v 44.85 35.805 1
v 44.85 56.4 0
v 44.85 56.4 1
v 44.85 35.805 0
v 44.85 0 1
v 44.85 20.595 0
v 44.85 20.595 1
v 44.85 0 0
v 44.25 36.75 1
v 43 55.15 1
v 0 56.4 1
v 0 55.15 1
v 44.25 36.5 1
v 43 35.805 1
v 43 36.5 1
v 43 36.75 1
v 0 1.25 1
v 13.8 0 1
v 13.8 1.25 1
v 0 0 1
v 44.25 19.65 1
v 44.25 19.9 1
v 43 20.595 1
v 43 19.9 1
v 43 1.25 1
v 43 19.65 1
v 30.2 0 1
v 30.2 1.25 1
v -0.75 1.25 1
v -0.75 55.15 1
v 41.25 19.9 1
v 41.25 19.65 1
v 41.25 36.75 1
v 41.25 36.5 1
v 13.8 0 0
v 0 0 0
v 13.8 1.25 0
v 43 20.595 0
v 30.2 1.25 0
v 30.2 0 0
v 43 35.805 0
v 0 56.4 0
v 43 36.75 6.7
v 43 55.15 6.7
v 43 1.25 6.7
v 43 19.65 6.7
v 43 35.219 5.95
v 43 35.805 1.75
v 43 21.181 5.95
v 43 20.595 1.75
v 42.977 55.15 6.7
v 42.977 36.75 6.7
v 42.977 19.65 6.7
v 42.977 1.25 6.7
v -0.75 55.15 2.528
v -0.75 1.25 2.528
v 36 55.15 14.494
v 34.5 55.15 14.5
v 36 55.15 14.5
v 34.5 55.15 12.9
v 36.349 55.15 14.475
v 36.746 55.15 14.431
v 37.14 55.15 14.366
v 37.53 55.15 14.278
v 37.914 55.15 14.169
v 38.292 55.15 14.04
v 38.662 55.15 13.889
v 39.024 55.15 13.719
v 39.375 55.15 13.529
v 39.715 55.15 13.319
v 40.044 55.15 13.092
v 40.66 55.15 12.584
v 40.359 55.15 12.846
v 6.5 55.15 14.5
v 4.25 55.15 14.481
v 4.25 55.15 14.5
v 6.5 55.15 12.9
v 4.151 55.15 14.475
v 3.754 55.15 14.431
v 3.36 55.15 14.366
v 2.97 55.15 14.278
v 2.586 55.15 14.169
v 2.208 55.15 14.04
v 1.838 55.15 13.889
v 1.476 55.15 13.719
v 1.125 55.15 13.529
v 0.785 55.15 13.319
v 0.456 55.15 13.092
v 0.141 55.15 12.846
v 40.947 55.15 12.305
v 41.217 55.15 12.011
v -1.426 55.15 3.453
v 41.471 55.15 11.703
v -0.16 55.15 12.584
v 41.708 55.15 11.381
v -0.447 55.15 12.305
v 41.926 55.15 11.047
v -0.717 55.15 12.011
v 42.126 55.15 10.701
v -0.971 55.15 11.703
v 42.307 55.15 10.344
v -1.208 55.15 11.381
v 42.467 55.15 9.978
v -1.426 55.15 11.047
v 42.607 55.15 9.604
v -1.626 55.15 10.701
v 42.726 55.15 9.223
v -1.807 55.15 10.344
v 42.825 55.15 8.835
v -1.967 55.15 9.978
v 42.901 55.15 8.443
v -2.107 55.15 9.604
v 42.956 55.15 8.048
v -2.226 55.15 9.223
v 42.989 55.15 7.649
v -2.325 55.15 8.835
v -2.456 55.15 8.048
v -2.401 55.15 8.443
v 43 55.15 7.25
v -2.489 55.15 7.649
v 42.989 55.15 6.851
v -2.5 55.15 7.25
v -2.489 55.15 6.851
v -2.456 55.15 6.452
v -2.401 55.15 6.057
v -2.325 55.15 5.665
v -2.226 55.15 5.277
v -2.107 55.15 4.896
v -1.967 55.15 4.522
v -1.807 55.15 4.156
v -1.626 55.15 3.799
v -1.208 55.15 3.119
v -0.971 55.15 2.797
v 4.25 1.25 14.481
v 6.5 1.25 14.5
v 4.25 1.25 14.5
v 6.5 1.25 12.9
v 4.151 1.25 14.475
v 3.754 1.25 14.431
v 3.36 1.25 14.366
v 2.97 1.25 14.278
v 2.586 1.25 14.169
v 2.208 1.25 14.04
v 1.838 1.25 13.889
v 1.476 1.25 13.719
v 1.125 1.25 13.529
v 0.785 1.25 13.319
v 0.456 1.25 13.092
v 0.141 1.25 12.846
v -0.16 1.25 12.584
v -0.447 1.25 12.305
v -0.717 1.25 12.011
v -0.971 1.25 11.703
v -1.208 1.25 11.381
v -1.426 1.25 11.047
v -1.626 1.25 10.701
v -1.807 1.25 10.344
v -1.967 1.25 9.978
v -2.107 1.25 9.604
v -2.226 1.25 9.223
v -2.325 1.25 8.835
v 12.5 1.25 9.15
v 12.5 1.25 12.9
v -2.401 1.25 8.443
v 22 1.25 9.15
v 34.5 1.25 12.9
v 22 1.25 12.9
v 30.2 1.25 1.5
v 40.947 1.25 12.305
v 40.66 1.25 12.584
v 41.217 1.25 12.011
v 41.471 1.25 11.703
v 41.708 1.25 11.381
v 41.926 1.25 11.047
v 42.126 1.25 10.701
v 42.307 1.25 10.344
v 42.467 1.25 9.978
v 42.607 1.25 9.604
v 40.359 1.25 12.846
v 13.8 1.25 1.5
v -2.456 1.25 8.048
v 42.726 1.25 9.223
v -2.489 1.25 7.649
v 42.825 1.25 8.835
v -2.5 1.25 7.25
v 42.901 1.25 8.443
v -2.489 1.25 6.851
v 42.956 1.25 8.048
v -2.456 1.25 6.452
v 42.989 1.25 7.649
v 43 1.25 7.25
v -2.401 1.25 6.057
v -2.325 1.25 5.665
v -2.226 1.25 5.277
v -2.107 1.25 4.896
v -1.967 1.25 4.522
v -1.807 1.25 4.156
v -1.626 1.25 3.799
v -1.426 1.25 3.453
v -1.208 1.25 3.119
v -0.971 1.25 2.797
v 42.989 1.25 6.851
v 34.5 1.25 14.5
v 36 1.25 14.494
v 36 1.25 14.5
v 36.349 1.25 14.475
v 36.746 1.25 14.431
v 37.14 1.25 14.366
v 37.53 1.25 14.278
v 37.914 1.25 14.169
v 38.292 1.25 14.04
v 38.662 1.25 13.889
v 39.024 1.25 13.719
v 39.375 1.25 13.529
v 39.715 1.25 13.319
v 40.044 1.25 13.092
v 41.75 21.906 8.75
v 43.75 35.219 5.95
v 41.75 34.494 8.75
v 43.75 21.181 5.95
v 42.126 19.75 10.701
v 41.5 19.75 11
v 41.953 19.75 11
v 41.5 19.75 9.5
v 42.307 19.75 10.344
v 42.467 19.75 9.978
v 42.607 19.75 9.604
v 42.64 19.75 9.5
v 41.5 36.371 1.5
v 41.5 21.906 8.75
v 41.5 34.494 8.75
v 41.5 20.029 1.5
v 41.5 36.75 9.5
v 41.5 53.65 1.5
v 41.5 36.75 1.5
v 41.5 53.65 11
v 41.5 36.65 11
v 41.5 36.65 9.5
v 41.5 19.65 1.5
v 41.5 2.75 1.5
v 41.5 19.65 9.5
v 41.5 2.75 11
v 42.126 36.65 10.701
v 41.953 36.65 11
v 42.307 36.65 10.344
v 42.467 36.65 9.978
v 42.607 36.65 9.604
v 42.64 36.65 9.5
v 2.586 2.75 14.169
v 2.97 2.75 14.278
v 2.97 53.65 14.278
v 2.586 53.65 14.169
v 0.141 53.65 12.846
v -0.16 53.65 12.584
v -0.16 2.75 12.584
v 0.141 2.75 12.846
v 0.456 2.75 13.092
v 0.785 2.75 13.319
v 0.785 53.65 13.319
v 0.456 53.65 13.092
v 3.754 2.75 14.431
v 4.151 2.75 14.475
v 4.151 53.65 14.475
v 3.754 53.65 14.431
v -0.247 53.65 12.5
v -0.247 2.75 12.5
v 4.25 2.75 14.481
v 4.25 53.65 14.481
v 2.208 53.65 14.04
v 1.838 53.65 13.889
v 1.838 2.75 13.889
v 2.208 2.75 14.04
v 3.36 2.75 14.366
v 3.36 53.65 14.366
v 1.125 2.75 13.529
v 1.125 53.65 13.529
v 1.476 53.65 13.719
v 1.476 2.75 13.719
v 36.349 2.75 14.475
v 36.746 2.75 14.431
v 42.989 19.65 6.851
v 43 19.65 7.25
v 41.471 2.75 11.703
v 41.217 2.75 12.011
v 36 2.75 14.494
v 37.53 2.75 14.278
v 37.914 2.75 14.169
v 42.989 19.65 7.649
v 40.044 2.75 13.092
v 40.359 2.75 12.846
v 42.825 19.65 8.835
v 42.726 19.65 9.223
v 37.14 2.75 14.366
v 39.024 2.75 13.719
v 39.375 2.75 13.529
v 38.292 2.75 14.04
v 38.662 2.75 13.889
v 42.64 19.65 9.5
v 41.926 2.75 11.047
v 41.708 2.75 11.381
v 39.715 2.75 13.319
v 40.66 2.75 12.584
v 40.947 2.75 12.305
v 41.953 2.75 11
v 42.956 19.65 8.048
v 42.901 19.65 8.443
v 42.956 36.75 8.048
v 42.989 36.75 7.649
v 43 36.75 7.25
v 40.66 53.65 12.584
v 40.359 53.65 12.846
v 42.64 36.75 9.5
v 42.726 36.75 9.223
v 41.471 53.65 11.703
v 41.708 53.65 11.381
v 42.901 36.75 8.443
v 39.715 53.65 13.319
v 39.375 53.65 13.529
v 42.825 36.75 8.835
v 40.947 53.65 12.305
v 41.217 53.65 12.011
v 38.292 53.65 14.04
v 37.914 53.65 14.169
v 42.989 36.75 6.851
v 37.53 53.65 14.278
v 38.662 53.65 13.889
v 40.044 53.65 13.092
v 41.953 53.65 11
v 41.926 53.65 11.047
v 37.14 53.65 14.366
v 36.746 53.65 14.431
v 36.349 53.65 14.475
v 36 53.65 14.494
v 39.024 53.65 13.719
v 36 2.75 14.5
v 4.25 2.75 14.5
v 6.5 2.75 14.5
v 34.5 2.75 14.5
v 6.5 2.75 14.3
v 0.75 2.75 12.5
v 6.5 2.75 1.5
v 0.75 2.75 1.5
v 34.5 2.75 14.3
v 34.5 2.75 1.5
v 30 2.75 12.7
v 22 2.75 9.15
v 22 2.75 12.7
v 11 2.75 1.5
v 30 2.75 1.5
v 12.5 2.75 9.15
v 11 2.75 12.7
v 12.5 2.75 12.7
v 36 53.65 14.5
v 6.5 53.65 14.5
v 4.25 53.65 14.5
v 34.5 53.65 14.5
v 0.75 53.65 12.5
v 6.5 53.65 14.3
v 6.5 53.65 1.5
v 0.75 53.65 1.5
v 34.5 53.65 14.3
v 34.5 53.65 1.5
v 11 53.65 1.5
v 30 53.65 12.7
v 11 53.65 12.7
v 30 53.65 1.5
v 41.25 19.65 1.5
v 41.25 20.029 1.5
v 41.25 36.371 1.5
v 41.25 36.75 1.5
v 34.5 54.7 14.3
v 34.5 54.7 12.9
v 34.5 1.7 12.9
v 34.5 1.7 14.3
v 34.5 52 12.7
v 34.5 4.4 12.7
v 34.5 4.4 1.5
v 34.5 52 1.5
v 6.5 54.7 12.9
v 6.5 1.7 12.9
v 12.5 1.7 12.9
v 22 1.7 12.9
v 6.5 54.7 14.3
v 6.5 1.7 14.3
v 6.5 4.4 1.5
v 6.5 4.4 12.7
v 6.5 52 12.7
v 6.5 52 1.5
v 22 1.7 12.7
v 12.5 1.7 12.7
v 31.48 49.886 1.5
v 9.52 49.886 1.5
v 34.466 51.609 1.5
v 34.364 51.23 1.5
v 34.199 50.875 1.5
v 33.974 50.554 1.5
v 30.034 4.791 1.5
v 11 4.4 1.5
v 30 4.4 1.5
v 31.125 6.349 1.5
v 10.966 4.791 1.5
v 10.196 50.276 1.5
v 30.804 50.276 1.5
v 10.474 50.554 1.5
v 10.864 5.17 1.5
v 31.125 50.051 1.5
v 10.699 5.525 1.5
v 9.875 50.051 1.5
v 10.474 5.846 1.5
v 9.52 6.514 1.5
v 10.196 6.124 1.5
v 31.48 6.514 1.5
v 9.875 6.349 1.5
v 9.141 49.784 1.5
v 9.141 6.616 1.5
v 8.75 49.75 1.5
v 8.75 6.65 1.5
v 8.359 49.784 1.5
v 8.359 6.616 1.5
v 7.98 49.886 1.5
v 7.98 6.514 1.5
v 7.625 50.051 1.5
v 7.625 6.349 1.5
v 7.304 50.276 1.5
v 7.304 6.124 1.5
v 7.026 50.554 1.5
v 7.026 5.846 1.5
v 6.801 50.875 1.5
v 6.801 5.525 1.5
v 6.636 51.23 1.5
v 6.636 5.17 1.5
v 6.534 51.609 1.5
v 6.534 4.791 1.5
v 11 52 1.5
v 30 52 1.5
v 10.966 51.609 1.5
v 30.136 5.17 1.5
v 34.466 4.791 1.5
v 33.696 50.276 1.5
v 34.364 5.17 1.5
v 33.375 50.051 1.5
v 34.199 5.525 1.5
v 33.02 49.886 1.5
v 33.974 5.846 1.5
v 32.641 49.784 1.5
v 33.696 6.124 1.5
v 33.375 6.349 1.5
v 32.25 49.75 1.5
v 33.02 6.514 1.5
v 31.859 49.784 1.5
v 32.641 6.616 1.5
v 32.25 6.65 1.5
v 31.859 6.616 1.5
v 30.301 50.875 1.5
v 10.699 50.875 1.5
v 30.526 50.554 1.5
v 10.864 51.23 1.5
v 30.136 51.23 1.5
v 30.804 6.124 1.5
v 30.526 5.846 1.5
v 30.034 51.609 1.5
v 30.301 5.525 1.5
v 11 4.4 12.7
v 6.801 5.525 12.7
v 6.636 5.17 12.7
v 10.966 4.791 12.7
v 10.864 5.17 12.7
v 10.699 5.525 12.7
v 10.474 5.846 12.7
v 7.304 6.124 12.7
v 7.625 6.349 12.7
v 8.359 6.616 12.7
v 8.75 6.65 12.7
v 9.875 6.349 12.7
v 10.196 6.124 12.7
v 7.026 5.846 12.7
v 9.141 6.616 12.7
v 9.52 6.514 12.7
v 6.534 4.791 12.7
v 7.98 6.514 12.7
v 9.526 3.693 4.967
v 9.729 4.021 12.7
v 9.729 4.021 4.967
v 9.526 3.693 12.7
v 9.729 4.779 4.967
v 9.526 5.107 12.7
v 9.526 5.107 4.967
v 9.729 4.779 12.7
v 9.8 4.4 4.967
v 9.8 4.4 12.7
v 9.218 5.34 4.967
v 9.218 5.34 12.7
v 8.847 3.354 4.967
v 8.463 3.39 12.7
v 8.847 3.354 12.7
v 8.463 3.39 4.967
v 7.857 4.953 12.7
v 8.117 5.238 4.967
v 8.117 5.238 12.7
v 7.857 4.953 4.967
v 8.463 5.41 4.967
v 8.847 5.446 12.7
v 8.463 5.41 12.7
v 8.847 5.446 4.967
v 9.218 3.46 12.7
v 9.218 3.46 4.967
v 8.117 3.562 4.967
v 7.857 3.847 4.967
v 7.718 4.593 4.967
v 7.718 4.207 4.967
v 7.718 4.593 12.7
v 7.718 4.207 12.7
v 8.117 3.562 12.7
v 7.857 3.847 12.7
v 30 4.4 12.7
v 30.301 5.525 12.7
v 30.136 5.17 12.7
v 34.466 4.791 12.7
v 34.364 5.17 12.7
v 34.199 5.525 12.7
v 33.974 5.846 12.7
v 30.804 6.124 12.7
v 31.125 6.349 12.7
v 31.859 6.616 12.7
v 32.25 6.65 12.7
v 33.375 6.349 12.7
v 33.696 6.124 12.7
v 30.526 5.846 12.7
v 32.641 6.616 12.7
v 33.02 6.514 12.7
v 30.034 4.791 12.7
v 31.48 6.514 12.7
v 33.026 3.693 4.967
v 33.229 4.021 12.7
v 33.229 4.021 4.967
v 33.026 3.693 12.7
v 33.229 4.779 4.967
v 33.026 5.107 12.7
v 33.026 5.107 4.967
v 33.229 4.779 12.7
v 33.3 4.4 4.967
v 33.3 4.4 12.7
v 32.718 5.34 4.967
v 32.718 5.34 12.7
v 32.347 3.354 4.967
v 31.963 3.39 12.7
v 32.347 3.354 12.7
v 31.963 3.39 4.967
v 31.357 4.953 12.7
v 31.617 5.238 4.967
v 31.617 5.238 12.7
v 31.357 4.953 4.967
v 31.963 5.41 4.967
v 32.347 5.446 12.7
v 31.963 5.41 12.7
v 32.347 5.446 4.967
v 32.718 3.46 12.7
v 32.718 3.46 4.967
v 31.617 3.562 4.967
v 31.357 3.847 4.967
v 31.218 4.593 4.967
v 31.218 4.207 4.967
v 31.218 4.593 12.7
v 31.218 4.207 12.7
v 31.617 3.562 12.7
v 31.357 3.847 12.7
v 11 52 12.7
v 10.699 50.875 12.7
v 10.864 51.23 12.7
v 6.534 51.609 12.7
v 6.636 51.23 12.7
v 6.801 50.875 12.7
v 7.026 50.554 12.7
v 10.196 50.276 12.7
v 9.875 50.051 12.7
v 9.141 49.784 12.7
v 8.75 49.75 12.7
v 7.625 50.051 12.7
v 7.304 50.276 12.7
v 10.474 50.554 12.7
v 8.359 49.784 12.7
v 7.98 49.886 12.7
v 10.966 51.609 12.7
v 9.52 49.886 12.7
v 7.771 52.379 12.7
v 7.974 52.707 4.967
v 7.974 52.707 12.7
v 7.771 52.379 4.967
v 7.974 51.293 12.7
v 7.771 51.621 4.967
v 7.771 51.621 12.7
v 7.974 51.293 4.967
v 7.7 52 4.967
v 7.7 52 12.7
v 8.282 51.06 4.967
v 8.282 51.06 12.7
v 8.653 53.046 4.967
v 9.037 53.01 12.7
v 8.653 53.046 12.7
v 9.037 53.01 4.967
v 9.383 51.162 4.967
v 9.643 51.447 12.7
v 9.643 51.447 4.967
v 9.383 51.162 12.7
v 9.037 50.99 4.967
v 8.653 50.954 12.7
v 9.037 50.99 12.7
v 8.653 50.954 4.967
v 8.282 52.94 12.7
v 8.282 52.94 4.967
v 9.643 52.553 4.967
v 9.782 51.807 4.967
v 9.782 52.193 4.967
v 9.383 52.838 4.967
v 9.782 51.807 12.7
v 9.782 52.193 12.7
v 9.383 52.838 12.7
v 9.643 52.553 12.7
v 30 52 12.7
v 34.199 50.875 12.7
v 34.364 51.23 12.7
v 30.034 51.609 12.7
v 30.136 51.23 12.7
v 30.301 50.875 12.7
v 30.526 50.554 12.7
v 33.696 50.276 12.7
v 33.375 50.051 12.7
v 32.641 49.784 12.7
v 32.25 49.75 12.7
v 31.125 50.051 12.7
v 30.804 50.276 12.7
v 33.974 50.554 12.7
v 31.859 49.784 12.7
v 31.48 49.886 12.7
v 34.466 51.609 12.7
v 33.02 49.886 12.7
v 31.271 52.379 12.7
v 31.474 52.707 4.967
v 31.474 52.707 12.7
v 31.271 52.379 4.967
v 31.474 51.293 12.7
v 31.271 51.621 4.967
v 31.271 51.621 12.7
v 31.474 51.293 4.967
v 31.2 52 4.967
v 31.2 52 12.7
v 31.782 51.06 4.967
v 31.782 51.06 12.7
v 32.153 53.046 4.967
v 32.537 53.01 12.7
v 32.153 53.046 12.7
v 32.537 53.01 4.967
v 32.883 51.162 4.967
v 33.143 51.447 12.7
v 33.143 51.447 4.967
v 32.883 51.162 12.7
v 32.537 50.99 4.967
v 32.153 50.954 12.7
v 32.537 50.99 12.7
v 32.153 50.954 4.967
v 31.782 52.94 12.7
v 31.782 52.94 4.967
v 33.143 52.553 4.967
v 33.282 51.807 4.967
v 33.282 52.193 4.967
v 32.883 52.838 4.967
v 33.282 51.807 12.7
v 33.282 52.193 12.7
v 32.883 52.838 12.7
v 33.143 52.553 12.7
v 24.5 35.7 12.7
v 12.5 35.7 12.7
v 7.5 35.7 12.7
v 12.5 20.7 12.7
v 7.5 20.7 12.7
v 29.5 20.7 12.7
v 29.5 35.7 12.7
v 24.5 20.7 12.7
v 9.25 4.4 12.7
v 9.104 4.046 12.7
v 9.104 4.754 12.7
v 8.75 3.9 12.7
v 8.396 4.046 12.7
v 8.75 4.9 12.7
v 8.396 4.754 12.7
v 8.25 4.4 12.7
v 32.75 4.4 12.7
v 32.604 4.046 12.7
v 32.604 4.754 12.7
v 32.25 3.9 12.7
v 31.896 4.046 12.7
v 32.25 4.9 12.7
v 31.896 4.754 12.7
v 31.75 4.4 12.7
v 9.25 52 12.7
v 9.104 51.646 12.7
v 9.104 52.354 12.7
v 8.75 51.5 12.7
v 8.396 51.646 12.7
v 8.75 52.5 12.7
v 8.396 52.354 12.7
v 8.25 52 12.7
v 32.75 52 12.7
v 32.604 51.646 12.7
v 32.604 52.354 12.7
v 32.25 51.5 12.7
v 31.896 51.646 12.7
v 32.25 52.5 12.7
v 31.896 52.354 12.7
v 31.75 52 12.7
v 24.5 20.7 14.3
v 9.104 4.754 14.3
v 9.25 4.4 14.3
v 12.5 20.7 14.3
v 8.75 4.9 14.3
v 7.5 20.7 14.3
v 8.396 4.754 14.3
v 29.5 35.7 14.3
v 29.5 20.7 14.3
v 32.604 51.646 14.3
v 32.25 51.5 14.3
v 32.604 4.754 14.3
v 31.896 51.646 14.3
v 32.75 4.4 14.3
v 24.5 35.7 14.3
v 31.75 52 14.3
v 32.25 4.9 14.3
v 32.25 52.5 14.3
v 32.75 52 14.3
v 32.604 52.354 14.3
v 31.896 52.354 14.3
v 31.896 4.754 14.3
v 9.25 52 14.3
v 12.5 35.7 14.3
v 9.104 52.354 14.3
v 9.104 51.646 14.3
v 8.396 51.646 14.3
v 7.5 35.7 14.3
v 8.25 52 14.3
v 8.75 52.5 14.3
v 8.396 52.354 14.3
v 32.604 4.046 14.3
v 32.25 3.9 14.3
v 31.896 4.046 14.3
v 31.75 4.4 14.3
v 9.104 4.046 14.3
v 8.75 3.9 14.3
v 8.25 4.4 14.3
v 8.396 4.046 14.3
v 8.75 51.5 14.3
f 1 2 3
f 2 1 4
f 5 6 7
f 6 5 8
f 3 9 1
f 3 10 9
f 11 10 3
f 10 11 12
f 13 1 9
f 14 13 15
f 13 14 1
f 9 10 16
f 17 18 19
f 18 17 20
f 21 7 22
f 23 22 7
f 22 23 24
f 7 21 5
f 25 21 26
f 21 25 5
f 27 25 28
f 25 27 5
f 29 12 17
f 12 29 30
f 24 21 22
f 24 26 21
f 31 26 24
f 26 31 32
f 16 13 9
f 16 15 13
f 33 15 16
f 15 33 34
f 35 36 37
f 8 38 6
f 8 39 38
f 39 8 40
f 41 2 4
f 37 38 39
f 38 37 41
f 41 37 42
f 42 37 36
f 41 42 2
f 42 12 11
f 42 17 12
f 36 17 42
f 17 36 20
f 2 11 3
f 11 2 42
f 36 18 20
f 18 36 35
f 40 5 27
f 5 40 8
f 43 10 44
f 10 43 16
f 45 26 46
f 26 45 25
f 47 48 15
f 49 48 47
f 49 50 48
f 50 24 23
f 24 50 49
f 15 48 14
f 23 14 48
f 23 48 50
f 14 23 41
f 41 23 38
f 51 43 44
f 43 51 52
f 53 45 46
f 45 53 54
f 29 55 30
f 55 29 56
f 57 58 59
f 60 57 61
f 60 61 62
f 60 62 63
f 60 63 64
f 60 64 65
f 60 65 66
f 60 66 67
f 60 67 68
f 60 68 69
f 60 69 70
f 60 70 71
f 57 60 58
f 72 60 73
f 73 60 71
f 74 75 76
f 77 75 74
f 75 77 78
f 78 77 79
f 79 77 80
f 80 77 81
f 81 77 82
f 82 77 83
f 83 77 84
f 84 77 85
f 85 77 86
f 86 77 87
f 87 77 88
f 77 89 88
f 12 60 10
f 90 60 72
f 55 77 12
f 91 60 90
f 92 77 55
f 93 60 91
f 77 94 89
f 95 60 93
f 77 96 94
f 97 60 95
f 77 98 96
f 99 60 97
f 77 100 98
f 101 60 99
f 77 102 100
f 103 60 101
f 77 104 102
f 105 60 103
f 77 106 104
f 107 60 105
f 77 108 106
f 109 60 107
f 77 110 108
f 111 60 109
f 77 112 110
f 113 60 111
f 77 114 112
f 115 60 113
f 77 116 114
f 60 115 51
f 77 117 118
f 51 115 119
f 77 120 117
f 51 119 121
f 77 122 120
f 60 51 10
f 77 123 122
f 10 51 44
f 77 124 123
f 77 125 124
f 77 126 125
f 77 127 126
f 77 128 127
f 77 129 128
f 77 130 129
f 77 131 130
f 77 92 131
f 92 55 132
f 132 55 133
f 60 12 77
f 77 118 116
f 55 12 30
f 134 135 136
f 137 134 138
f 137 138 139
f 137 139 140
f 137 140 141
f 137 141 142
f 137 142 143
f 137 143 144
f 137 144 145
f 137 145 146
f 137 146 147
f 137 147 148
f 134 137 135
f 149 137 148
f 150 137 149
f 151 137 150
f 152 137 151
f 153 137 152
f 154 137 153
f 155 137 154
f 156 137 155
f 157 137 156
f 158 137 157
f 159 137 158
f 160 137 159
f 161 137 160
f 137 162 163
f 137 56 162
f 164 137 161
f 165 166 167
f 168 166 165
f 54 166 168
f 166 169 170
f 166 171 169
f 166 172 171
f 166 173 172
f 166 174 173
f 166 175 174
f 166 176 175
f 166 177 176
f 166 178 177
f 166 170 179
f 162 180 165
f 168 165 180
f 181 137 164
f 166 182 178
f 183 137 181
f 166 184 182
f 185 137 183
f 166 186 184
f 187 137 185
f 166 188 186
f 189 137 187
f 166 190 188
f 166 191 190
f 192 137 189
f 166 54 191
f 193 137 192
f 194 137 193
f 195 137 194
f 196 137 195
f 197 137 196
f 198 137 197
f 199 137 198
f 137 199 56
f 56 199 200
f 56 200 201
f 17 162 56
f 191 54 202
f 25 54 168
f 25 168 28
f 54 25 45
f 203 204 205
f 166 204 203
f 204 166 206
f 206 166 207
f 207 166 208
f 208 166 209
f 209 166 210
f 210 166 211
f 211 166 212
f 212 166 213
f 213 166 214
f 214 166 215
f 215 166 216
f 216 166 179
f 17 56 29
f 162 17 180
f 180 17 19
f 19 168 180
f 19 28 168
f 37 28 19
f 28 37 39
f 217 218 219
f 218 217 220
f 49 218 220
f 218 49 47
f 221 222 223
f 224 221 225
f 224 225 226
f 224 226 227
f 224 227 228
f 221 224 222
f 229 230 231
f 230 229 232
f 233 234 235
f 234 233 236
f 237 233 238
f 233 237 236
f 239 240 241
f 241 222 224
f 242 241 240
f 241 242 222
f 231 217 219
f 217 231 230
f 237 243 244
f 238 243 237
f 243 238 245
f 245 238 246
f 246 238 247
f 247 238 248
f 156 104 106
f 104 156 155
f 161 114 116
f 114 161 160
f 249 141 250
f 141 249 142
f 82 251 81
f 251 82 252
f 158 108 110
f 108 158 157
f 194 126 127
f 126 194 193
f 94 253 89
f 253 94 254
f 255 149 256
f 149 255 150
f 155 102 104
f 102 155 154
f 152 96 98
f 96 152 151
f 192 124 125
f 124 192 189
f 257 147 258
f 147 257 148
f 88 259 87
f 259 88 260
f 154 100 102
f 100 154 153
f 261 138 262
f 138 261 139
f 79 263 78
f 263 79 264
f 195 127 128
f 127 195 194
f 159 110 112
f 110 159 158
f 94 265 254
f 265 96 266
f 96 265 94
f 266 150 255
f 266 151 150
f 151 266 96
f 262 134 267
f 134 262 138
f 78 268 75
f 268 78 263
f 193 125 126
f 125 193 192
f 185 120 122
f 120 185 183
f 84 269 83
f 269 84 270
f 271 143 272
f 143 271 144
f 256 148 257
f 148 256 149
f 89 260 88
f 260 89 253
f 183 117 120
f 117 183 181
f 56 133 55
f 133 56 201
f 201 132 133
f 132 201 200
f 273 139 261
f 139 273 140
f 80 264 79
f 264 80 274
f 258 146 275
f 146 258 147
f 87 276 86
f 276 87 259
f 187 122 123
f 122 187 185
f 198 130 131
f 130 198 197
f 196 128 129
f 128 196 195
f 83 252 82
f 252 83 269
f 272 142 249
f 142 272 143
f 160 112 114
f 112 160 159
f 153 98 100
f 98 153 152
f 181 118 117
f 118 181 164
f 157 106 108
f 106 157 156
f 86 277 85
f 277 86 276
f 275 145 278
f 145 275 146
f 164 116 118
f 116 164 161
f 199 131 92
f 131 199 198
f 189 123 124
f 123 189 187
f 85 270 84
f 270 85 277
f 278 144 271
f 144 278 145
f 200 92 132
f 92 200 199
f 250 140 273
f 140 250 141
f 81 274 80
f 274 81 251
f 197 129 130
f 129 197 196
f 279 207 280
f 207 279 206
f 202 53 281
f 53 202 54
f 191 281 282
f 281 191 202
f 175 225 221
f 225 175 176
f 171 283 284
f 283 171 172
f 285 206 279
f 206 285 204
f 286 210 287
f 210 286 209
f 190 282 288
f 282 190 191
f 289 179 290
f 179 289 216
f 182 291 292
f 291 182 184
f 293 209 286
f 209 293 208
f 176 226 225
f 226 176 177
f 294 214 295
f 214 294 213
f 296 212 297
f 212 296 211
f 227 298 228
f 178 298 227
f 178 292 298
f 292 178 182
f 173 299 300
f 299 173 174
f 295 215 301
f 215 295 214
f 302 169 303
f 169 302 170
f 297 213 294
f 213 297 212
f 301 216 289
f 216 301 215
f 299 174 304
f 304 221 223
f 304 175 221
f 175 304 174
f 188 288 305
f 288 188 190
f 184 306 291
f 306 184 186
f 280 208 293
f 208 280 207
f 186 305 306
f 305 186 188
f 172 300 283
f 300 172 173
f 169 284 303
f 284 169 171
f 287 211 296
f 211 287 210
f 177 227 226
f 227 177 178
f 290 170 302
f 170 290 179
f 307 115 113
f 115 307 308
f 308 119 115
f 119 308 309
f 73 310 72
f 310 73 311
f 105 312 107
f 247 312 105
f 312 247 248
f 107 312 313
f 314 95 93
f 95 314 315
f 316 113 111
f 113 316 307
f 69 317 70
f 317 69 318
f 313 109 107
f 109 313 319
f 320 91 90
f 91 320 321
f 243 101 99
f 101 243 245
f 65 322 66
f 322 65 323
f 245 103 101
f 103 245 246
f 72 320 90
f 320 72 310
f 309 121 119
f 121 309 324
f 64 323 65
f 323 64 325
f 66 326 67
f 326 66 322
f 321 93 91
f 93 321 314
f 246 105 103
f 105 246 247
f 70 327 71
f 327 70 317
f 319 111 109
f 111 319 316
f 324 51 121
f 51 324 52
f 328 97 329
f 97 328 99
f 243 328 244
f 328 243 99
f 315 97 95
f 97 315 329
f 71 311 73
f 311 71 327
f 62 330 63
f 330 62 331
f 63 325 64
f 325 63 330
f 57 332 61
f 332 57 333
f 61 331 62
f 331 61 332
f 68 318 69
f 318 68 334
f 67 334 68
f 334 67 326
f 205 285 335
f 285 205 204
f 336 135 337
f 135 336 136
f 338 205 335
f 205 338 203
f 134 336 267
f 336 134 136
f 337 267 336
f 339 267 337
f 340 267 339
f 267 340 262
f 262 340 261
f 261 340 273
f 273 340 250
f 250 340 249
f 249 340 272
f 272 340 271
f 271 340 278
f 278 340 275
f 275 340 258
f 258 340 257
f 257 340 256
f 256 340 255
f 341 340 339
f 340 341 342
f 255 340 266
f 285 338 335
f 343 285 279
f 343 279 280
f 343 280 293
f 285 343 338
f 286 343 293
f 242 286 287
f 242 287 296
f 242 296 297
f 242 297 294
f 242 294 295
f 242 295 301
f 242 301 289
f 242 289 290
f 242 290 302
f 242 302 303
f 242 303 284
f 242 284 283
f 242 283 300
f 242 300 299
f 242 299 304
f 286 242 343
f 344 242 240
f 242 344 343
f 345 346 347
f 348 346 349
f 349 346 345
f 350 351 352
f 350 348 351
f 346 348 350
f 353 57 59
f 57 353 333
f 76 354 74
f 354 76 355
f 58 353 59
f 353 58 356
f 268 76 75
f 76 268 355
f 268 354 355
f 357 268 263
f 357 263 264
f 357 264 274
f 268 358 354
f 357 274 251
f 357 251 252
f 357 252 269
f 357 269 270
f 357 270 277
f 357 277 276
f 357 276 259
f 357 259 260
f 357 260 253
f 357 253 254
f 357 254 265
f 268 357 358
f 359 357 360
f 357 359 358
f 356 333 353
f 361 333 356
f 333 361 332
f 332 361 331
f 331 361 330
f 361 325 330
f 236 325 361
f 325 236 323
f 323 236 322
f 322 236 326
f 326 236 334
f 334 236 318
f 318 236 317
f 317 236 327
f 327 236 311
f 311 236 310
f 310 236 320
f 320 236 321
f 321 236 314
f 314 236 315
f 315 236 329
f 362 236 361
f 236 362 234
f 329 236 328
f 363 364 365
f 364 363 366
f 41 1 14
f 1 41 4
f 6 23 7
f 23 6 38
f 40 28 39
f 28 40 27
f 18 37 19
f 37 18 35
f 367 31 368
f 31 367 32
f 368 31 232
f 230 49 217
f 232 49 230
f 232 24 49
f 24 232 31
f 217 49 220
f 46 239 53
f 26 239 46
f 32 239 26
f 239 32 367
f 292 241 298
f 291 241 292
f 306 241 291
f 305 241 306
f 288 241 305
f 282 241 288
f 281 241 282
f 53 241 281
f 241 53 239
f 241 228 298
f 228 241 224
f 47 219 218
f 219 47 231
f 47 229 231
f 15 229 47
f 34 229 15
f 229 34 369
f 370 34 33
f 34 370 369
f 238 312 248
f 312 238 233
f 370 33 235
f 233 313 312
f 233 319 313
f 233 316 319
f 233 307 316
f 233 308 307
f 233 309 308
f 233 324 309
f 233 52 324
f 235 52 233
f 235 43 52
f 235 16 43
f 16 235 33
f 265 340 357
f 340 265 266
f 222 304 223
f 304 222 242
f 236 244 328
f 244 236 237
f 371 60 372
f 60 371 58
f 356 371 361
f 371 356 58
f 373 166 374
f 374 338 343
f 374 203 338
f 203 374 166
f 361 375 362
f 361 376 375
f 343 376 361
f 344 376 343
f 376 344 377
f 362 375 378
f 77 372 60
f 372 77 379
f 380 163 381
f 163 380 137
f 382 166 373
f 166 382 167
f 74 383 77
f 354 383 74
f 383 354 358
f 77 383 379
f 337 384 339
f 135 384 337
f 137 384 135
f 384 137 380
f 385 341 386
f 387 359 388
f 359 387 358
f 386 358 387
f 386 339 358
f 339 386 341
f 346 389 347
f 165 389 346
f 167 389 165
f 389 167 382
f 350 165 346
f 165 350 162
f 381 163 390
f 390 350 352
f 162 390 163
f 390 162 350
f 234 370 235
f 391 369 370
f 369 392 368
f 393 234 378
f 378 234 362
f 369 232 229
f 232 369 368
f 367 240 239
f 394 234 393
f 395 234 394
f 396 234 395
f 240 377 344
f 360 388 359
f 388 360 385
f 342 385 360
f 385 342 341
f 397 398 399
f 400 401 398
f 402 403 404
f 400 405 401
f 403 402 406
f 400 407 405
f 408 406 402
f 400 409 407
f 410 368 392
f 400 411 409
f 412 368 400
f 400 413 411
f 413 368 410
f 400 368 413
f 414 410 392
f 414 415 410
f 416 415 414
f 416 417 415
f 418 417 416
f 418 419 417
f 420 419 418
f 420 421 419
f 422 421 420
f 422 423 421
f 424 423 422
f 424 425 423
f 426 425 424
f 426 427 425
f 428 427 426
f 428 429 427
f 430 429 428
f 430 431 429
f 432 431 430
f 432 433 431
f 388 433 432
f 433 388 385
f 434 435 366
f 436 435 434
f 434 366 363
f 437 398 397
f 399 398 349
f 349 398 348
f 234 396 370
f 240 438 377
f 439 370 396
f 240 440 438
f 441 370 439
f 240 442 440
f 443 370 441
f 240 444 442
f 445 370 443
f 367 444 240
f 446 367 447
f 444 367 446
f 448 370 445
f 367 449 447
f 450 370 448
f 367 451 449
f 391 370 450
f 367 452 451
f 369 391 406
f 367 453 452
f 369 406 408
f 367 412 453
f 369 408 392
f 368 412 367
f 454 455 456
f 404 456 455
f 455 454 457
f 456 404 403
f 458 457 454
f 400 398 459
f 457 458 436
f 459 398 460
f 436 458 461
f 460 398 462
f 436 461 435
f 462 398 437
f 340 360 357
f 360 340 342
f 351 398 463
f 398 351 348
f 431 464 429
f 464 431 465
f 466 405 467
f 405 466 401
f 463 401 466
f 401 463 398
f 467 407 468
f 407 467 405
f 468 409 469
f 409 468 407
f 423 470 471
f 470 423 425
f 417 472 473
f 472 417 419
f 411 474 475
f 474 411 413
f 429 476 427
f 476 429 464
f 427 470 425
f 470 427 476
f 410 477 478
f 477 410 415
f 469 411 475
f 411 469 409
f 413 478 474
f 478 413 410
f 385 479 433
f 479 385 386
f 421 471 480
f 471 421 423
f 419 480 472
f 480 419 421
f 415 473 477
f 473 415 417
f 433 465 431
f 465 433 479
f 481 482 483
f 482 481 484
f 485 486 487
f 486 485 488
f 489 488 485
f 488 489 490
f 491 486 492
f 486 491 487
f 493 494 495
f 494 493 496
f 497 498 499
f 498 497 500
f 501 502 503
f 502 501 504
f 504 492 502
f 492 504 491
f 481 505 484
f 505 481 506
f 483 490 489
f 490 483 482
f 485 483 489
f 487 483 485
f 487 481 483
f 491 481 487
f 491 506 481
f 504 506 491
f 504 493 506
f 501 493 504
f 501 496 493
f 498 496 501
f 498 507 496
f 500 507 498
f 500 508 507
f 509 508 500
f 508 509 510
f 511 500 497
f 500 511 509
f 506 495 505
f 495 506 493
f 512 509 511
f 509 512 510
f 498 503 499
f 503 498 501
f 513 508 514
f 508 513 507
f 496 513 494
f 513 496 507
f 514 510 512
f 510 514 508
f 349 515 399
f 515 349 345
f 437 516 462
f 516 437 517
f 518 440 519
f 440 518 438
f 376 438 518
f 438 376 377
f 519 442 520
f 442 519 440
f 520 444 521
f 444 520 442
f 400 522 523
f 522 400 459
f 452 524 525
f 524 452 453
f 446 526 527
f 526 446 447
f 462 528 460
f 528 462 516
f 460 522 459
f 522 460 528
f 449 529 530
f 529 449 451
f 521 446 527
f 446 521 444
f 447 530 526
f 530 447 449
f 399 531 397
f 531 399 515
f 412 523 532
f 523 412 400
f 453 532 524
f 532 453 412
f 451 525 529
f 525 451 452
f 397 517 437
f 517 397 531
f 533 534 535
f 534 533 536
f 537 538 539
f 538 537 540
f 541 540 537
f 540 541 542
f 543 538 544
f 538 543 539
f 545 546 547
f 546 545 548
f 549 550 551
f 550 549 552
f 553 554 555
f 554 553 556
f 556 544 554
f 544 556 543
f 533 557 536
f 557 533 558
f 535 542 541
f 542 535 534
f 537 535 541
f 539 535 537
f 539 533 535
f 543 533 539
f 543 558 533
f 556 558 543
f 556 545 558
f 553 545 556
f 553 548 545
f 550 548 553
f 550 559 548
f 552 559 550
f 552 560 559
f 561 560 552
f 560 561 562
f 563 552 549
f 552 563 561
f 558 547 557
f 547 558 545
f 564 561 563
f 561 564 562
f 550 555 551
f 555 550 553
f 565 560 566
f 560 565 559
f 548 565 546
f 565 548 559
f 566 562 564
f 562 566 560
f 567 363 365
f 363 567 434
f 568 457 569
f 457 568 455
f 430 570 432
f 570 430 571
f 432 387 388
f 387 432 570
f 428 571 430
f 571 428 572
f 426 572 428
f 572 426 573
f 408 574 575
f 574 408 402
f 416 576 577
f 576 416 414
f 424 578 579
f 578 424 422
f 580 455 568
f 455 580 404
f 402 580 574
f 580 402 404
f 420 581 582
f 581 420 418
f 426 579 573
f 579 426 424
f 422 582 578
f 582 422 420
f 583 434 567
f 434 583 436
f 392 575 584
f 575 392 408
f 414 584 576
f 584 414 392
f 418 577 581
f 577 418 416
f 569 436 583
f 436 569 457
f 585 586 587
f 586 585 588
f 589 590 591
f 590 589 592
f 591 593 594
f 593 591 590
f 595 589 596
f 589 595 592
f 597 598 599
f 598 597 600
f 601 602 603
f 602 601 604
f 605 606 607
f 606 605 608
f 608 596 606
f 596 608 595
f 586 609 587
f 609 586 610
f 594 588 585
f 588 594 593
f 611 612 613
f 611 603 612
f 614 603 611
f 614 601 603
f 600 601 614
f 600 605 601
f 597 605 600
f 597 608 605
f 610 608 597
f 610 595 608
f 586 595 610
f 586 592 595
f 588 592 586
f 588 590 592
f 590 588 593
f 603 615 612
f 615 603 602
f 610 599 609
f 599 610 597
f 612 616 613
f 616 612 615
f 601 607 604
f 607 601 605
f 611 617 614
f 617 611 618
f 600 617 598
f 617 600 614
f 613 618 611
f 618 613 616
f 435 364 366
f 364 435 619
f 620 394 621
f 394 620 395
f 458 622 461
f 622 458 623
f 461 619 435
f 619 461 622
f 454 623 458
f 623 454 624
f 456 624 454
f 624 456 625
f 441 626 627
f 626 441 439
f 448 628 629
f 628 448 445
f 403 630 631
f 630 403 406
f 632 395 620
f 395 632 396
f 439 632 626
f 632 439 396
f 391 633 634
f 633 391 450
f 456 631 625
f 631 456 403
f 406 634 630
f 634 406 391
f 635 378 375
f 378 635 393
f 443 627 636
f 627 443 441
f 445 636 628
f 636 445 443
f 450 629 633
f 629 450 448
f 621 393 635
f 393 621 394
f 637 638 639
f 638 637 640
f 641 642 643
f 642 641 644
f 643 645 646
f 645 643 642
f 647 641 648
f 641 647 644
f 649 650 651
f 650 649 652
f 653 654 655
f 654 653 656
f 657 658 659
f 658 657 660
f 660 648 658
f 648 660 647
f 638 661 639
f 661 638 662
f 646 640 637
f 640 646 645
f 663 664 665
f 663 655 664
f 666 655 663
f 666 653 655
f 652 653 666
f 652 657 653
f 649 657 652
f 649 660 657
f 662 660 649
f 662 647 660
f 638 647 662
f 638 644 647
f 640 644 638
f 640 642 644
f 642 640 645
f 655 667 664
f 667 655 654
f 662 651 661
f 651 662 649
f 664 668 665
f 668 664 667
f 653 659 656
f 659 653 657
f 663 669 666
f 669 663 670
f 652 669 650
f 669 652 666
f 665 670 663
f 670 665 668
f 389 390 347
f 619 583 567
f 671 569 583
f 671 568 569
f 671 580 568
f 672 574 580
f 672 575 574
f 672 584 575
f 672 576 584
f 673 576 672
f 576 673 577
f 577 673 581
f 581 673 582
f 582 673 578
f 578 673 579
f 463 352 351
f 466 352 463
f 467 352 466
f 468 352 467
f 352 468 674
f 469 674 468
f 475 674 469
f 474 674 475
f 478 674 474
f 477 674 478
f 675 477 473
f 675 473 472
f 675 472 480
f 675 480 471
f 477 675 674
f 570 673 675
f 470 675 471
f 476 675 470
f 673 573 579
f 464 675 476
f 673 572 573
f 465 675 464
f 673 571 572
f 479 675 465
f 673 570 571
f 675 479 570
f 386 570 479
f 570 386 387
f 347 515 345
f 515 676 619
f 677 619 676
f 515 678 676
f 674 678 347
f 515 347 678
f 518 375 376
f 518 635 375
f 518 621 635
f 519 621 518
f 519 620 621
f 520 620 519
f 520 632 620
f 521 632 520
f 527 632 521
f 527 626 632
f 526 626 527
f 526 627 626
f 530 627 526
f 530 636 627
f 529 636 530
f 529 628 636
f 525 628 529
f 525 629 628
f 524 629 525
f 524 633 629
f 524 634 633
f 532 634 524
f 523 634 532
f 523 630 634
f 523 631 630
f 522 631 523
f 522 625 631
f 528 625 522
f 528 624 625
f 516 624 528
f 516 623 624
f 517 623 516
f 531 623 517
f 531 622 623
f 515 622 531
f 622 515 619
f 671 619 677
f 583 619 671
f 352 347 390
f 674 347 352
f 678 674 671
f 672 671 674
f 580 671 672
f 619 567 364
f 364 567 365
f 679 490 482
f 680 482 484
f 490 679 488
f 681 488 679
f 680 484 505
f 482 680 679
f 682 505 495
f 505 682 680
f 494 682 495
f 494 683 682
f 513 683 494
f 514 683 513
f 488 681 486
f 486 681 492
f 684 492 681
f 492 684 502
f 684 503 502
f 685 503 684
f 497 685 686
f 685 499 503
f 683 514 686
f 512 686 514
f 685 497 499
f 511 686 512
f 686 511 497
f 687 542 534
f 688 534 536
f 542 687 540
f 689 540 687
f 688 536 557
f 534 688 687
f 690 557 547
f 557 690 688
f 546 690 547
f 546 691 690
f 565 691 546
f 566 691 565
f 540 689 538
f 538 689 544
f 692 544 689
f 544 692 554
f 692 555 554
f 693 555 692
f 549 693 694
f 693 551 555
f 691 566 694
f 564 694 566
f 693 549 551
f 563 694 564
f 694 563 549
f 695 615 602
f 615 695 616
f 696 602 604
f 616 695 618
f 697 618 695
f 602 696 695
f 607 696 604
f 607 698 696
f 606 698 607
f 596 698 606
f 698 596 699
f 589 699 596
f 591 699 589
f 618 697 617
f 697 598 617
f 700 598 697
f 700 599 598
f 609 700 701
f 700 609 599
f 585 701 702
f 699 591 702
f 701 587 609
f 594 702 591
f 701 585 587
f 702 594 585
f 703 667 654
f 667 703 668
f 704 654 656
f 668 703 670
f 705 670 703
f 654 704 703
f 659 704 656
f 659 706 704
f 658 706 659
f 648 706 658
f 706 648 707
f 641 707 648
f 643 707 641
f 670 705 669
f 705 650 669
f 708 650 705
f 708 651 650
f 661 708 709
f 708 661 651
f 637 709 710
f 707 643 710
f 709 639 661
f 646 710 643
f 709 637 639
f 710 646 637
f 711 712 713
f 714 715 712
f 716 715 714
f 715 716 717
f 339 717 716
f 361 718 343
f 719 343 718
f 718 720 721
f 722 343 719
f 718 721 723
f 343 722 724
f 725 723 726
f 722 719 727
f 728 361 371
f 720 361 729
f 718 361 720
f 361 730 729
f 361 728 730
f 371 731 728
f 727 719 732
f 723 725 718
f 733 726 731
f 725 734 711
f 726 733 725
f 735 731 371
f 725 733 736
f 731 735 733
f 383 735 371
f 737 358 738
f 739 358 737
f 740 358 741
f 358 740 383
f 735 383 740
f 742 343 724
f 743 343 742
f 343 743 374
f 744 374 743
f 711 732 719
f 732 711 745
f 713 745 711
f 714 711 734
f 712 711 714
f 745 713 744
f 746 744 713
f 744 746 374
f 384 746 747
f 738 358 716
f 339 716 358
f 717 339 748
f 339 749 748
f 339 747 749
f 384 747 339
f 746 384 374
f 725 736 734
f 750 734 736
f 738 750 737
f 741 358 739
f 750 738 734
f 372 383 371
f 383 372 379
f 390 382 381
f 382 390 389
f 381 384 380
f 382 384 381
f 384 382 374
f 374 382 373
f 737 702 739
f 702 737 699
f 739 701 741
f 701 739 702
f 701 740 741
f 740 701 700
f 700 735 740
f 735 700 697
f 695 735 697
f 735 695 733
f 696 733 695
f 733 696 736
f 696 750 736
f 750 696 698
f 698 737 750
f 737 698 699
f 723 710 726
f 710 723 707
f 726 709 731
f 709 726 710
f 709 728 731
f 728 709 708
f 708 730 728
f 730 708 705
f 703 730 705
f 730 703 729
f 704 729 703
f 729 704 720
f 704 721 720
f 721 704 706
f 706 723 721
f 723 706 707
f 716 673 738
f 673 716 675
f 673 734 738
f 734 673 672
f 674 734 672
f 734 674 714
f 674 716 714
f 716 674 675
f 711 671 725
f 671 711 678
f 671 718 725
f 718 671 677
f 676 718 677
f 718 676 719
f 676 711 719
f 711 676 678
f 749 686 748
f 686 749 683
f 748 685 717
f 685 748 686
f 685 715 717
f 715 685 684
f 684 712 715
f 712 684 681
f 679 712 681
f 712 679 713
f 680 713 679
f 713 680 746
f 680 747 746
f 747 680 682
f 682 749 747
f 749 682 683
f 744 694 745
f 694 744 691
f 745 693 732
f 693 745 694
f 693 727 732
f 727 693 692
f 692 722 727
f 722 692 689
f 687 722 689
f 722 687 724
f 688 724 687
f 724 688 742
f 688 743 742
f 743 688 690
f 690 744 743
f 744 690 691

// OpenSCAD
/*
  TI-58/59 Battery Lid
  This is intended to hold a PCB and a LiPo battery,
  and charge from USB. 

  Dimensions more or less 'cribbed' from a BP-1 and an
  existing STL model that I imported into FreeCAD to measure.

  Version 1.1
  T. LeMense
  December 21, 2020
*/


$fa = 1;
$fs = 0.4;

// baseplate (first surface)
base_t = 1.0;
base_w = 44.85;
base_l = 56.4;
ledge_t = 1.25;
ledge_t1 = 0.75;
ledge_t2 = 1.85;

// PCB information
pcb_t = 1.6;
pcb_w = 28;
pcb_l = 53;
pcb_z = 13.5-pcb_t;
pcb_x = 6.5;

// USB connector cutout
// MOLEX 1050170001
usb_t = 3.75;
usb_w = 9.5;

// "superstructure"
super_w = base_w - ledge_t2 + ledge_t1;
super_l = base_l - 2*ledge_t;
super_h = 5.7;  // the "straight rise" from baseplate
super_z = base_t;  // the "altitude" at which everything starts
super_wall_t = 1.5;
super_floor_t = 0.5;
round_rad = (pcb_z+pcb_t+super_z)/2;

// latch 'tab' is extruded 2D
latch_tab_t = super_wall_t + 0.75;
latch_tab_h = 2.8;
latch_tab_t2 = 0.25;
latch_tab_w = 16.9;
latch_tab_z = 4.95;

p0 = [0, 0];
p1 = [0, latch_tab_h];
p2 = [latch_tab_t2,latch_tab_h];
p3 = [latch_tab_t,0];
tab_points = [p0, p1, p2, p3];
    
// hinge cutouts is extruded 2D
latch_tab_w2 = 12.0;
latch_tab_h2 = super_h+latch_tab_h;

p4 = [0, 0];
p5 = [0, latch_tab_h2];
p6 = [(latch_tab_w - latch_tab_w2)/2,latch_tab_h2];
p7 = [latch_tab_t2,0];
cutout_points = [p4, p5, p6, p7];

echo("inside cavity width is", super_w-2*super_wall_t);
echo("inside cavity length is", super_l-2*super_wall_t);
echo("PCB dimensions are ",pcb_w," x ",pcb_l);

module RoundedBoss(side,height,hole_dia){
    difference() {
        union() {
        cube([side,side/2,height]);
        translate([side/2,side/2,0])
        cylinder(r=side/2,h=height);
        }
        
        translate([side/2,side/2,height/3])
        cylinder(r=hole_dia/2,h=height/1.5);
    }
}

function RoundedBossHoleCenter(side,height,hole_dia) = [side/2,side/2,0];
   

/* 
  Define some "cuts" to export as DXF, to help
  guide the PCB size (cut 1) and PCB hole placement
  (cut 2).

  uncomment the projection.. and the desired translate line
*/

//projection(cut = true) 
//translate([0,0,-base_t/2])   //cut1
//translate([0,0,-pcb_z])   //cut2
//translate([0,0,-10.5])  //cut3
//translate([0,0,-20]) //cut4

union(){
difference() {
    union() {
        
// additive items        
        
    // the baseplate
    cube(size=[base_w, base_l, base_t]);
        
    // the superstructure inner volume
    translate([-0.75, 1.25, super_z])
    cube([super_w, super_l,super_h]); 

    // the locking tab
    translate([-ledge_t1-super_wall_t+super_w,ledge_t+(super_l/2)+(latch_tab_w/2),latch_tab_z+super_z]) 
    rotate([90,0,0]) 
    linear_extrude(height=latch_tab_w) polygon(tab_points);
        
    // the rounded rear wall
    translate([-ledge_t1+5.5,ledge_t,round_rad]) 
    rotate([-90,0,0]) 
    cylinder(r=round_rad,h=super_l);
        
    // the two rounded walls on either side of latch
    translate([-ledge_t1+super_w-round_rad,ledge_t,round_rad]) 
    rotate([-90,0,0]) 
    cylinder(r=round_rad,h=super_l/2-latch_tab_w/2);

    translate([-0.75+super_w-round_rad,base_l-ledge_t,round_rad]) 
    rotate([90,0,0]) 
    cylinder(r=round_rad,h=super_l/2-latch_tab_w/2);
        
    // complete the side walls
    translate ([(5-0.75),ledge_t,super_z])
    cube([super_w-12,super_wall_t,2*round_rad-super_z]);        

    translate ([(5-0.75),base_l-ledge_t-super_wall_t,super_z])
    cube([super_w-12,super_wall_t,2*round_rad-super_z]);
    }
    
// subtractive items            
    
    // remove the locking tab release slot
    translate([base_w - 1.85,1.25+(super_l/2)-(latch_tab_w*0.9/2),-0.25]) 
    cube([2,latch_tab_w*0.9,2]);
    
    // remove the polarizing baseplate notch
    translate([13.8,-1.25,-0.5]) cube([16.4,2.5,2]);
        
    // remove the two hinge cutouts
    translate([-1-super_wall_t+super_w,1.25+(super_l/2)-(latch_tab_w/2)-0.1,super_z])
    rotate([90,0,90])
    linear_extrude(height=2*super_wall_t)
    polygon(cutout_points);
    
    translate([-1+super_wall_t+super_w,1.25+(super_l/2)+(latch_tab_w/2)+0.1,super_z])
    rotate([90,0,-90]) 
    linear_extrude(height=2*super_wall_t) 
    polygon(cutout_points);

    // flatten the rounded wall edges
    translate([-2, 1.25+super_wall_t, super_z+11.5])
    cube([5,super_l-2*super_wall_t,5]);
    translate([base_w-4, 1.25+super_wall_t, super_z+10])
    cube([5,super_l-2*super_wall_t,5]);

    // remove cutout for PCB
    translate([pcb_x,0,super_z+pcb_z])
    cube([pcb_w, pcb_l+4, pcb_t+1]);
    
    // remove cutout for USB micro B
    translate([pcb_x+6,0,super_z+pcb_z-usb_t])
    cube([usb_w,5,5]);

    // remove the superstructure insides
    translate([-0.75+super_wall_t, 1.25+super_wall_t, super_z+super_floor_t])
    cube([super_w-2*super_wall_t, super_l-2*super_wall_t, 20]); 
 
}


// mounting screw bosses
boss_l = 4.5;
boss_dia = 2.1;
boss_inset = (boss_l - boss_dia)/4;

translate([pcb_x,ledge_t+super_wall_t-boss_inset,super_z])
RoundedBoss(boss_l,pcb_z,boss_dia);  // for #2 screw
h1 = [pcb_x+boss_l/2,ledge_t+super_wall_t-boss_inset+boss_l/2,0];

translate([pcb_x+pcb_w-boss_l,ledge_t+super_wall_t-boss_inset,super_z])
RoundedBoss(boss_l,pcb_z,boss_dia);  // for #2 screw
h2 = [pcb_x+pcb_w-boss_l/2,ledge_t+super_wall_t-boss_inset+boss_l/2,0];

translate([pcb_x+boss_l,base_l-ledge_t-super_wall_t+boss_inset,super_z])
rotate([0,0,180])
RoundedBoss(boss_l,pcb_z,boss_dia);  // for #2 screw
h3 = [pcb_x+boss_l/2,base_l-ledge_t-super_wall_t+boss_inset-boss_l/2,0];

translate([pcb_x+pcb_w,base_l-ledge_t-super_wall_t+boss_inset,super_z])
rotate([0,0,180])
RoundedBoss(boss_l,pcb_z,boss_dia);  // for #2 screw
h4 = [pcb_x+pcb_w-boss_l/2,base_l-ledge_t-super_wall_t+boss_inset-boss_l/2,0];


// uncomment this block if a pcb "model" is desired
pcb_model_z = 20;
pcb_model_z = pcb_z+pcb_t/2;
//hole_dia = 0.086 * 25.4;
pad_width = 5;
pad_length = 15;
hole_dia = 1;
pad1_x = 10;
pad2_x = 27;
echo ("pad1 center ",[pad1_x,base_l/2]);
echo ("pad2 center ",[pad2_x,base_l/2]);

translate([0,0,pcb_model_z]) 
    color("green") 
    linear_extrude(height=pcb_t) 
    difference(){
       translate ([pcb_x,(base_l-pcb_l)/2,0]) square ([pcb_w,pcb_l],false); 
       translate([pad1_x,base_l/2,pcb_model_z])        square([pad_width,pad_length],true);
       translate([pad2_x,base_l/2,pcb_model_z])        square([pad_width,pad_length],true);
       translate(h1) circle(d = hole_dia);
       translate(h2) circle(d = hole_dia);
       translate(h3) circle(d = hole_dia);
       translate(h4) circle(d = hole_dia);
    }
//*/
}
